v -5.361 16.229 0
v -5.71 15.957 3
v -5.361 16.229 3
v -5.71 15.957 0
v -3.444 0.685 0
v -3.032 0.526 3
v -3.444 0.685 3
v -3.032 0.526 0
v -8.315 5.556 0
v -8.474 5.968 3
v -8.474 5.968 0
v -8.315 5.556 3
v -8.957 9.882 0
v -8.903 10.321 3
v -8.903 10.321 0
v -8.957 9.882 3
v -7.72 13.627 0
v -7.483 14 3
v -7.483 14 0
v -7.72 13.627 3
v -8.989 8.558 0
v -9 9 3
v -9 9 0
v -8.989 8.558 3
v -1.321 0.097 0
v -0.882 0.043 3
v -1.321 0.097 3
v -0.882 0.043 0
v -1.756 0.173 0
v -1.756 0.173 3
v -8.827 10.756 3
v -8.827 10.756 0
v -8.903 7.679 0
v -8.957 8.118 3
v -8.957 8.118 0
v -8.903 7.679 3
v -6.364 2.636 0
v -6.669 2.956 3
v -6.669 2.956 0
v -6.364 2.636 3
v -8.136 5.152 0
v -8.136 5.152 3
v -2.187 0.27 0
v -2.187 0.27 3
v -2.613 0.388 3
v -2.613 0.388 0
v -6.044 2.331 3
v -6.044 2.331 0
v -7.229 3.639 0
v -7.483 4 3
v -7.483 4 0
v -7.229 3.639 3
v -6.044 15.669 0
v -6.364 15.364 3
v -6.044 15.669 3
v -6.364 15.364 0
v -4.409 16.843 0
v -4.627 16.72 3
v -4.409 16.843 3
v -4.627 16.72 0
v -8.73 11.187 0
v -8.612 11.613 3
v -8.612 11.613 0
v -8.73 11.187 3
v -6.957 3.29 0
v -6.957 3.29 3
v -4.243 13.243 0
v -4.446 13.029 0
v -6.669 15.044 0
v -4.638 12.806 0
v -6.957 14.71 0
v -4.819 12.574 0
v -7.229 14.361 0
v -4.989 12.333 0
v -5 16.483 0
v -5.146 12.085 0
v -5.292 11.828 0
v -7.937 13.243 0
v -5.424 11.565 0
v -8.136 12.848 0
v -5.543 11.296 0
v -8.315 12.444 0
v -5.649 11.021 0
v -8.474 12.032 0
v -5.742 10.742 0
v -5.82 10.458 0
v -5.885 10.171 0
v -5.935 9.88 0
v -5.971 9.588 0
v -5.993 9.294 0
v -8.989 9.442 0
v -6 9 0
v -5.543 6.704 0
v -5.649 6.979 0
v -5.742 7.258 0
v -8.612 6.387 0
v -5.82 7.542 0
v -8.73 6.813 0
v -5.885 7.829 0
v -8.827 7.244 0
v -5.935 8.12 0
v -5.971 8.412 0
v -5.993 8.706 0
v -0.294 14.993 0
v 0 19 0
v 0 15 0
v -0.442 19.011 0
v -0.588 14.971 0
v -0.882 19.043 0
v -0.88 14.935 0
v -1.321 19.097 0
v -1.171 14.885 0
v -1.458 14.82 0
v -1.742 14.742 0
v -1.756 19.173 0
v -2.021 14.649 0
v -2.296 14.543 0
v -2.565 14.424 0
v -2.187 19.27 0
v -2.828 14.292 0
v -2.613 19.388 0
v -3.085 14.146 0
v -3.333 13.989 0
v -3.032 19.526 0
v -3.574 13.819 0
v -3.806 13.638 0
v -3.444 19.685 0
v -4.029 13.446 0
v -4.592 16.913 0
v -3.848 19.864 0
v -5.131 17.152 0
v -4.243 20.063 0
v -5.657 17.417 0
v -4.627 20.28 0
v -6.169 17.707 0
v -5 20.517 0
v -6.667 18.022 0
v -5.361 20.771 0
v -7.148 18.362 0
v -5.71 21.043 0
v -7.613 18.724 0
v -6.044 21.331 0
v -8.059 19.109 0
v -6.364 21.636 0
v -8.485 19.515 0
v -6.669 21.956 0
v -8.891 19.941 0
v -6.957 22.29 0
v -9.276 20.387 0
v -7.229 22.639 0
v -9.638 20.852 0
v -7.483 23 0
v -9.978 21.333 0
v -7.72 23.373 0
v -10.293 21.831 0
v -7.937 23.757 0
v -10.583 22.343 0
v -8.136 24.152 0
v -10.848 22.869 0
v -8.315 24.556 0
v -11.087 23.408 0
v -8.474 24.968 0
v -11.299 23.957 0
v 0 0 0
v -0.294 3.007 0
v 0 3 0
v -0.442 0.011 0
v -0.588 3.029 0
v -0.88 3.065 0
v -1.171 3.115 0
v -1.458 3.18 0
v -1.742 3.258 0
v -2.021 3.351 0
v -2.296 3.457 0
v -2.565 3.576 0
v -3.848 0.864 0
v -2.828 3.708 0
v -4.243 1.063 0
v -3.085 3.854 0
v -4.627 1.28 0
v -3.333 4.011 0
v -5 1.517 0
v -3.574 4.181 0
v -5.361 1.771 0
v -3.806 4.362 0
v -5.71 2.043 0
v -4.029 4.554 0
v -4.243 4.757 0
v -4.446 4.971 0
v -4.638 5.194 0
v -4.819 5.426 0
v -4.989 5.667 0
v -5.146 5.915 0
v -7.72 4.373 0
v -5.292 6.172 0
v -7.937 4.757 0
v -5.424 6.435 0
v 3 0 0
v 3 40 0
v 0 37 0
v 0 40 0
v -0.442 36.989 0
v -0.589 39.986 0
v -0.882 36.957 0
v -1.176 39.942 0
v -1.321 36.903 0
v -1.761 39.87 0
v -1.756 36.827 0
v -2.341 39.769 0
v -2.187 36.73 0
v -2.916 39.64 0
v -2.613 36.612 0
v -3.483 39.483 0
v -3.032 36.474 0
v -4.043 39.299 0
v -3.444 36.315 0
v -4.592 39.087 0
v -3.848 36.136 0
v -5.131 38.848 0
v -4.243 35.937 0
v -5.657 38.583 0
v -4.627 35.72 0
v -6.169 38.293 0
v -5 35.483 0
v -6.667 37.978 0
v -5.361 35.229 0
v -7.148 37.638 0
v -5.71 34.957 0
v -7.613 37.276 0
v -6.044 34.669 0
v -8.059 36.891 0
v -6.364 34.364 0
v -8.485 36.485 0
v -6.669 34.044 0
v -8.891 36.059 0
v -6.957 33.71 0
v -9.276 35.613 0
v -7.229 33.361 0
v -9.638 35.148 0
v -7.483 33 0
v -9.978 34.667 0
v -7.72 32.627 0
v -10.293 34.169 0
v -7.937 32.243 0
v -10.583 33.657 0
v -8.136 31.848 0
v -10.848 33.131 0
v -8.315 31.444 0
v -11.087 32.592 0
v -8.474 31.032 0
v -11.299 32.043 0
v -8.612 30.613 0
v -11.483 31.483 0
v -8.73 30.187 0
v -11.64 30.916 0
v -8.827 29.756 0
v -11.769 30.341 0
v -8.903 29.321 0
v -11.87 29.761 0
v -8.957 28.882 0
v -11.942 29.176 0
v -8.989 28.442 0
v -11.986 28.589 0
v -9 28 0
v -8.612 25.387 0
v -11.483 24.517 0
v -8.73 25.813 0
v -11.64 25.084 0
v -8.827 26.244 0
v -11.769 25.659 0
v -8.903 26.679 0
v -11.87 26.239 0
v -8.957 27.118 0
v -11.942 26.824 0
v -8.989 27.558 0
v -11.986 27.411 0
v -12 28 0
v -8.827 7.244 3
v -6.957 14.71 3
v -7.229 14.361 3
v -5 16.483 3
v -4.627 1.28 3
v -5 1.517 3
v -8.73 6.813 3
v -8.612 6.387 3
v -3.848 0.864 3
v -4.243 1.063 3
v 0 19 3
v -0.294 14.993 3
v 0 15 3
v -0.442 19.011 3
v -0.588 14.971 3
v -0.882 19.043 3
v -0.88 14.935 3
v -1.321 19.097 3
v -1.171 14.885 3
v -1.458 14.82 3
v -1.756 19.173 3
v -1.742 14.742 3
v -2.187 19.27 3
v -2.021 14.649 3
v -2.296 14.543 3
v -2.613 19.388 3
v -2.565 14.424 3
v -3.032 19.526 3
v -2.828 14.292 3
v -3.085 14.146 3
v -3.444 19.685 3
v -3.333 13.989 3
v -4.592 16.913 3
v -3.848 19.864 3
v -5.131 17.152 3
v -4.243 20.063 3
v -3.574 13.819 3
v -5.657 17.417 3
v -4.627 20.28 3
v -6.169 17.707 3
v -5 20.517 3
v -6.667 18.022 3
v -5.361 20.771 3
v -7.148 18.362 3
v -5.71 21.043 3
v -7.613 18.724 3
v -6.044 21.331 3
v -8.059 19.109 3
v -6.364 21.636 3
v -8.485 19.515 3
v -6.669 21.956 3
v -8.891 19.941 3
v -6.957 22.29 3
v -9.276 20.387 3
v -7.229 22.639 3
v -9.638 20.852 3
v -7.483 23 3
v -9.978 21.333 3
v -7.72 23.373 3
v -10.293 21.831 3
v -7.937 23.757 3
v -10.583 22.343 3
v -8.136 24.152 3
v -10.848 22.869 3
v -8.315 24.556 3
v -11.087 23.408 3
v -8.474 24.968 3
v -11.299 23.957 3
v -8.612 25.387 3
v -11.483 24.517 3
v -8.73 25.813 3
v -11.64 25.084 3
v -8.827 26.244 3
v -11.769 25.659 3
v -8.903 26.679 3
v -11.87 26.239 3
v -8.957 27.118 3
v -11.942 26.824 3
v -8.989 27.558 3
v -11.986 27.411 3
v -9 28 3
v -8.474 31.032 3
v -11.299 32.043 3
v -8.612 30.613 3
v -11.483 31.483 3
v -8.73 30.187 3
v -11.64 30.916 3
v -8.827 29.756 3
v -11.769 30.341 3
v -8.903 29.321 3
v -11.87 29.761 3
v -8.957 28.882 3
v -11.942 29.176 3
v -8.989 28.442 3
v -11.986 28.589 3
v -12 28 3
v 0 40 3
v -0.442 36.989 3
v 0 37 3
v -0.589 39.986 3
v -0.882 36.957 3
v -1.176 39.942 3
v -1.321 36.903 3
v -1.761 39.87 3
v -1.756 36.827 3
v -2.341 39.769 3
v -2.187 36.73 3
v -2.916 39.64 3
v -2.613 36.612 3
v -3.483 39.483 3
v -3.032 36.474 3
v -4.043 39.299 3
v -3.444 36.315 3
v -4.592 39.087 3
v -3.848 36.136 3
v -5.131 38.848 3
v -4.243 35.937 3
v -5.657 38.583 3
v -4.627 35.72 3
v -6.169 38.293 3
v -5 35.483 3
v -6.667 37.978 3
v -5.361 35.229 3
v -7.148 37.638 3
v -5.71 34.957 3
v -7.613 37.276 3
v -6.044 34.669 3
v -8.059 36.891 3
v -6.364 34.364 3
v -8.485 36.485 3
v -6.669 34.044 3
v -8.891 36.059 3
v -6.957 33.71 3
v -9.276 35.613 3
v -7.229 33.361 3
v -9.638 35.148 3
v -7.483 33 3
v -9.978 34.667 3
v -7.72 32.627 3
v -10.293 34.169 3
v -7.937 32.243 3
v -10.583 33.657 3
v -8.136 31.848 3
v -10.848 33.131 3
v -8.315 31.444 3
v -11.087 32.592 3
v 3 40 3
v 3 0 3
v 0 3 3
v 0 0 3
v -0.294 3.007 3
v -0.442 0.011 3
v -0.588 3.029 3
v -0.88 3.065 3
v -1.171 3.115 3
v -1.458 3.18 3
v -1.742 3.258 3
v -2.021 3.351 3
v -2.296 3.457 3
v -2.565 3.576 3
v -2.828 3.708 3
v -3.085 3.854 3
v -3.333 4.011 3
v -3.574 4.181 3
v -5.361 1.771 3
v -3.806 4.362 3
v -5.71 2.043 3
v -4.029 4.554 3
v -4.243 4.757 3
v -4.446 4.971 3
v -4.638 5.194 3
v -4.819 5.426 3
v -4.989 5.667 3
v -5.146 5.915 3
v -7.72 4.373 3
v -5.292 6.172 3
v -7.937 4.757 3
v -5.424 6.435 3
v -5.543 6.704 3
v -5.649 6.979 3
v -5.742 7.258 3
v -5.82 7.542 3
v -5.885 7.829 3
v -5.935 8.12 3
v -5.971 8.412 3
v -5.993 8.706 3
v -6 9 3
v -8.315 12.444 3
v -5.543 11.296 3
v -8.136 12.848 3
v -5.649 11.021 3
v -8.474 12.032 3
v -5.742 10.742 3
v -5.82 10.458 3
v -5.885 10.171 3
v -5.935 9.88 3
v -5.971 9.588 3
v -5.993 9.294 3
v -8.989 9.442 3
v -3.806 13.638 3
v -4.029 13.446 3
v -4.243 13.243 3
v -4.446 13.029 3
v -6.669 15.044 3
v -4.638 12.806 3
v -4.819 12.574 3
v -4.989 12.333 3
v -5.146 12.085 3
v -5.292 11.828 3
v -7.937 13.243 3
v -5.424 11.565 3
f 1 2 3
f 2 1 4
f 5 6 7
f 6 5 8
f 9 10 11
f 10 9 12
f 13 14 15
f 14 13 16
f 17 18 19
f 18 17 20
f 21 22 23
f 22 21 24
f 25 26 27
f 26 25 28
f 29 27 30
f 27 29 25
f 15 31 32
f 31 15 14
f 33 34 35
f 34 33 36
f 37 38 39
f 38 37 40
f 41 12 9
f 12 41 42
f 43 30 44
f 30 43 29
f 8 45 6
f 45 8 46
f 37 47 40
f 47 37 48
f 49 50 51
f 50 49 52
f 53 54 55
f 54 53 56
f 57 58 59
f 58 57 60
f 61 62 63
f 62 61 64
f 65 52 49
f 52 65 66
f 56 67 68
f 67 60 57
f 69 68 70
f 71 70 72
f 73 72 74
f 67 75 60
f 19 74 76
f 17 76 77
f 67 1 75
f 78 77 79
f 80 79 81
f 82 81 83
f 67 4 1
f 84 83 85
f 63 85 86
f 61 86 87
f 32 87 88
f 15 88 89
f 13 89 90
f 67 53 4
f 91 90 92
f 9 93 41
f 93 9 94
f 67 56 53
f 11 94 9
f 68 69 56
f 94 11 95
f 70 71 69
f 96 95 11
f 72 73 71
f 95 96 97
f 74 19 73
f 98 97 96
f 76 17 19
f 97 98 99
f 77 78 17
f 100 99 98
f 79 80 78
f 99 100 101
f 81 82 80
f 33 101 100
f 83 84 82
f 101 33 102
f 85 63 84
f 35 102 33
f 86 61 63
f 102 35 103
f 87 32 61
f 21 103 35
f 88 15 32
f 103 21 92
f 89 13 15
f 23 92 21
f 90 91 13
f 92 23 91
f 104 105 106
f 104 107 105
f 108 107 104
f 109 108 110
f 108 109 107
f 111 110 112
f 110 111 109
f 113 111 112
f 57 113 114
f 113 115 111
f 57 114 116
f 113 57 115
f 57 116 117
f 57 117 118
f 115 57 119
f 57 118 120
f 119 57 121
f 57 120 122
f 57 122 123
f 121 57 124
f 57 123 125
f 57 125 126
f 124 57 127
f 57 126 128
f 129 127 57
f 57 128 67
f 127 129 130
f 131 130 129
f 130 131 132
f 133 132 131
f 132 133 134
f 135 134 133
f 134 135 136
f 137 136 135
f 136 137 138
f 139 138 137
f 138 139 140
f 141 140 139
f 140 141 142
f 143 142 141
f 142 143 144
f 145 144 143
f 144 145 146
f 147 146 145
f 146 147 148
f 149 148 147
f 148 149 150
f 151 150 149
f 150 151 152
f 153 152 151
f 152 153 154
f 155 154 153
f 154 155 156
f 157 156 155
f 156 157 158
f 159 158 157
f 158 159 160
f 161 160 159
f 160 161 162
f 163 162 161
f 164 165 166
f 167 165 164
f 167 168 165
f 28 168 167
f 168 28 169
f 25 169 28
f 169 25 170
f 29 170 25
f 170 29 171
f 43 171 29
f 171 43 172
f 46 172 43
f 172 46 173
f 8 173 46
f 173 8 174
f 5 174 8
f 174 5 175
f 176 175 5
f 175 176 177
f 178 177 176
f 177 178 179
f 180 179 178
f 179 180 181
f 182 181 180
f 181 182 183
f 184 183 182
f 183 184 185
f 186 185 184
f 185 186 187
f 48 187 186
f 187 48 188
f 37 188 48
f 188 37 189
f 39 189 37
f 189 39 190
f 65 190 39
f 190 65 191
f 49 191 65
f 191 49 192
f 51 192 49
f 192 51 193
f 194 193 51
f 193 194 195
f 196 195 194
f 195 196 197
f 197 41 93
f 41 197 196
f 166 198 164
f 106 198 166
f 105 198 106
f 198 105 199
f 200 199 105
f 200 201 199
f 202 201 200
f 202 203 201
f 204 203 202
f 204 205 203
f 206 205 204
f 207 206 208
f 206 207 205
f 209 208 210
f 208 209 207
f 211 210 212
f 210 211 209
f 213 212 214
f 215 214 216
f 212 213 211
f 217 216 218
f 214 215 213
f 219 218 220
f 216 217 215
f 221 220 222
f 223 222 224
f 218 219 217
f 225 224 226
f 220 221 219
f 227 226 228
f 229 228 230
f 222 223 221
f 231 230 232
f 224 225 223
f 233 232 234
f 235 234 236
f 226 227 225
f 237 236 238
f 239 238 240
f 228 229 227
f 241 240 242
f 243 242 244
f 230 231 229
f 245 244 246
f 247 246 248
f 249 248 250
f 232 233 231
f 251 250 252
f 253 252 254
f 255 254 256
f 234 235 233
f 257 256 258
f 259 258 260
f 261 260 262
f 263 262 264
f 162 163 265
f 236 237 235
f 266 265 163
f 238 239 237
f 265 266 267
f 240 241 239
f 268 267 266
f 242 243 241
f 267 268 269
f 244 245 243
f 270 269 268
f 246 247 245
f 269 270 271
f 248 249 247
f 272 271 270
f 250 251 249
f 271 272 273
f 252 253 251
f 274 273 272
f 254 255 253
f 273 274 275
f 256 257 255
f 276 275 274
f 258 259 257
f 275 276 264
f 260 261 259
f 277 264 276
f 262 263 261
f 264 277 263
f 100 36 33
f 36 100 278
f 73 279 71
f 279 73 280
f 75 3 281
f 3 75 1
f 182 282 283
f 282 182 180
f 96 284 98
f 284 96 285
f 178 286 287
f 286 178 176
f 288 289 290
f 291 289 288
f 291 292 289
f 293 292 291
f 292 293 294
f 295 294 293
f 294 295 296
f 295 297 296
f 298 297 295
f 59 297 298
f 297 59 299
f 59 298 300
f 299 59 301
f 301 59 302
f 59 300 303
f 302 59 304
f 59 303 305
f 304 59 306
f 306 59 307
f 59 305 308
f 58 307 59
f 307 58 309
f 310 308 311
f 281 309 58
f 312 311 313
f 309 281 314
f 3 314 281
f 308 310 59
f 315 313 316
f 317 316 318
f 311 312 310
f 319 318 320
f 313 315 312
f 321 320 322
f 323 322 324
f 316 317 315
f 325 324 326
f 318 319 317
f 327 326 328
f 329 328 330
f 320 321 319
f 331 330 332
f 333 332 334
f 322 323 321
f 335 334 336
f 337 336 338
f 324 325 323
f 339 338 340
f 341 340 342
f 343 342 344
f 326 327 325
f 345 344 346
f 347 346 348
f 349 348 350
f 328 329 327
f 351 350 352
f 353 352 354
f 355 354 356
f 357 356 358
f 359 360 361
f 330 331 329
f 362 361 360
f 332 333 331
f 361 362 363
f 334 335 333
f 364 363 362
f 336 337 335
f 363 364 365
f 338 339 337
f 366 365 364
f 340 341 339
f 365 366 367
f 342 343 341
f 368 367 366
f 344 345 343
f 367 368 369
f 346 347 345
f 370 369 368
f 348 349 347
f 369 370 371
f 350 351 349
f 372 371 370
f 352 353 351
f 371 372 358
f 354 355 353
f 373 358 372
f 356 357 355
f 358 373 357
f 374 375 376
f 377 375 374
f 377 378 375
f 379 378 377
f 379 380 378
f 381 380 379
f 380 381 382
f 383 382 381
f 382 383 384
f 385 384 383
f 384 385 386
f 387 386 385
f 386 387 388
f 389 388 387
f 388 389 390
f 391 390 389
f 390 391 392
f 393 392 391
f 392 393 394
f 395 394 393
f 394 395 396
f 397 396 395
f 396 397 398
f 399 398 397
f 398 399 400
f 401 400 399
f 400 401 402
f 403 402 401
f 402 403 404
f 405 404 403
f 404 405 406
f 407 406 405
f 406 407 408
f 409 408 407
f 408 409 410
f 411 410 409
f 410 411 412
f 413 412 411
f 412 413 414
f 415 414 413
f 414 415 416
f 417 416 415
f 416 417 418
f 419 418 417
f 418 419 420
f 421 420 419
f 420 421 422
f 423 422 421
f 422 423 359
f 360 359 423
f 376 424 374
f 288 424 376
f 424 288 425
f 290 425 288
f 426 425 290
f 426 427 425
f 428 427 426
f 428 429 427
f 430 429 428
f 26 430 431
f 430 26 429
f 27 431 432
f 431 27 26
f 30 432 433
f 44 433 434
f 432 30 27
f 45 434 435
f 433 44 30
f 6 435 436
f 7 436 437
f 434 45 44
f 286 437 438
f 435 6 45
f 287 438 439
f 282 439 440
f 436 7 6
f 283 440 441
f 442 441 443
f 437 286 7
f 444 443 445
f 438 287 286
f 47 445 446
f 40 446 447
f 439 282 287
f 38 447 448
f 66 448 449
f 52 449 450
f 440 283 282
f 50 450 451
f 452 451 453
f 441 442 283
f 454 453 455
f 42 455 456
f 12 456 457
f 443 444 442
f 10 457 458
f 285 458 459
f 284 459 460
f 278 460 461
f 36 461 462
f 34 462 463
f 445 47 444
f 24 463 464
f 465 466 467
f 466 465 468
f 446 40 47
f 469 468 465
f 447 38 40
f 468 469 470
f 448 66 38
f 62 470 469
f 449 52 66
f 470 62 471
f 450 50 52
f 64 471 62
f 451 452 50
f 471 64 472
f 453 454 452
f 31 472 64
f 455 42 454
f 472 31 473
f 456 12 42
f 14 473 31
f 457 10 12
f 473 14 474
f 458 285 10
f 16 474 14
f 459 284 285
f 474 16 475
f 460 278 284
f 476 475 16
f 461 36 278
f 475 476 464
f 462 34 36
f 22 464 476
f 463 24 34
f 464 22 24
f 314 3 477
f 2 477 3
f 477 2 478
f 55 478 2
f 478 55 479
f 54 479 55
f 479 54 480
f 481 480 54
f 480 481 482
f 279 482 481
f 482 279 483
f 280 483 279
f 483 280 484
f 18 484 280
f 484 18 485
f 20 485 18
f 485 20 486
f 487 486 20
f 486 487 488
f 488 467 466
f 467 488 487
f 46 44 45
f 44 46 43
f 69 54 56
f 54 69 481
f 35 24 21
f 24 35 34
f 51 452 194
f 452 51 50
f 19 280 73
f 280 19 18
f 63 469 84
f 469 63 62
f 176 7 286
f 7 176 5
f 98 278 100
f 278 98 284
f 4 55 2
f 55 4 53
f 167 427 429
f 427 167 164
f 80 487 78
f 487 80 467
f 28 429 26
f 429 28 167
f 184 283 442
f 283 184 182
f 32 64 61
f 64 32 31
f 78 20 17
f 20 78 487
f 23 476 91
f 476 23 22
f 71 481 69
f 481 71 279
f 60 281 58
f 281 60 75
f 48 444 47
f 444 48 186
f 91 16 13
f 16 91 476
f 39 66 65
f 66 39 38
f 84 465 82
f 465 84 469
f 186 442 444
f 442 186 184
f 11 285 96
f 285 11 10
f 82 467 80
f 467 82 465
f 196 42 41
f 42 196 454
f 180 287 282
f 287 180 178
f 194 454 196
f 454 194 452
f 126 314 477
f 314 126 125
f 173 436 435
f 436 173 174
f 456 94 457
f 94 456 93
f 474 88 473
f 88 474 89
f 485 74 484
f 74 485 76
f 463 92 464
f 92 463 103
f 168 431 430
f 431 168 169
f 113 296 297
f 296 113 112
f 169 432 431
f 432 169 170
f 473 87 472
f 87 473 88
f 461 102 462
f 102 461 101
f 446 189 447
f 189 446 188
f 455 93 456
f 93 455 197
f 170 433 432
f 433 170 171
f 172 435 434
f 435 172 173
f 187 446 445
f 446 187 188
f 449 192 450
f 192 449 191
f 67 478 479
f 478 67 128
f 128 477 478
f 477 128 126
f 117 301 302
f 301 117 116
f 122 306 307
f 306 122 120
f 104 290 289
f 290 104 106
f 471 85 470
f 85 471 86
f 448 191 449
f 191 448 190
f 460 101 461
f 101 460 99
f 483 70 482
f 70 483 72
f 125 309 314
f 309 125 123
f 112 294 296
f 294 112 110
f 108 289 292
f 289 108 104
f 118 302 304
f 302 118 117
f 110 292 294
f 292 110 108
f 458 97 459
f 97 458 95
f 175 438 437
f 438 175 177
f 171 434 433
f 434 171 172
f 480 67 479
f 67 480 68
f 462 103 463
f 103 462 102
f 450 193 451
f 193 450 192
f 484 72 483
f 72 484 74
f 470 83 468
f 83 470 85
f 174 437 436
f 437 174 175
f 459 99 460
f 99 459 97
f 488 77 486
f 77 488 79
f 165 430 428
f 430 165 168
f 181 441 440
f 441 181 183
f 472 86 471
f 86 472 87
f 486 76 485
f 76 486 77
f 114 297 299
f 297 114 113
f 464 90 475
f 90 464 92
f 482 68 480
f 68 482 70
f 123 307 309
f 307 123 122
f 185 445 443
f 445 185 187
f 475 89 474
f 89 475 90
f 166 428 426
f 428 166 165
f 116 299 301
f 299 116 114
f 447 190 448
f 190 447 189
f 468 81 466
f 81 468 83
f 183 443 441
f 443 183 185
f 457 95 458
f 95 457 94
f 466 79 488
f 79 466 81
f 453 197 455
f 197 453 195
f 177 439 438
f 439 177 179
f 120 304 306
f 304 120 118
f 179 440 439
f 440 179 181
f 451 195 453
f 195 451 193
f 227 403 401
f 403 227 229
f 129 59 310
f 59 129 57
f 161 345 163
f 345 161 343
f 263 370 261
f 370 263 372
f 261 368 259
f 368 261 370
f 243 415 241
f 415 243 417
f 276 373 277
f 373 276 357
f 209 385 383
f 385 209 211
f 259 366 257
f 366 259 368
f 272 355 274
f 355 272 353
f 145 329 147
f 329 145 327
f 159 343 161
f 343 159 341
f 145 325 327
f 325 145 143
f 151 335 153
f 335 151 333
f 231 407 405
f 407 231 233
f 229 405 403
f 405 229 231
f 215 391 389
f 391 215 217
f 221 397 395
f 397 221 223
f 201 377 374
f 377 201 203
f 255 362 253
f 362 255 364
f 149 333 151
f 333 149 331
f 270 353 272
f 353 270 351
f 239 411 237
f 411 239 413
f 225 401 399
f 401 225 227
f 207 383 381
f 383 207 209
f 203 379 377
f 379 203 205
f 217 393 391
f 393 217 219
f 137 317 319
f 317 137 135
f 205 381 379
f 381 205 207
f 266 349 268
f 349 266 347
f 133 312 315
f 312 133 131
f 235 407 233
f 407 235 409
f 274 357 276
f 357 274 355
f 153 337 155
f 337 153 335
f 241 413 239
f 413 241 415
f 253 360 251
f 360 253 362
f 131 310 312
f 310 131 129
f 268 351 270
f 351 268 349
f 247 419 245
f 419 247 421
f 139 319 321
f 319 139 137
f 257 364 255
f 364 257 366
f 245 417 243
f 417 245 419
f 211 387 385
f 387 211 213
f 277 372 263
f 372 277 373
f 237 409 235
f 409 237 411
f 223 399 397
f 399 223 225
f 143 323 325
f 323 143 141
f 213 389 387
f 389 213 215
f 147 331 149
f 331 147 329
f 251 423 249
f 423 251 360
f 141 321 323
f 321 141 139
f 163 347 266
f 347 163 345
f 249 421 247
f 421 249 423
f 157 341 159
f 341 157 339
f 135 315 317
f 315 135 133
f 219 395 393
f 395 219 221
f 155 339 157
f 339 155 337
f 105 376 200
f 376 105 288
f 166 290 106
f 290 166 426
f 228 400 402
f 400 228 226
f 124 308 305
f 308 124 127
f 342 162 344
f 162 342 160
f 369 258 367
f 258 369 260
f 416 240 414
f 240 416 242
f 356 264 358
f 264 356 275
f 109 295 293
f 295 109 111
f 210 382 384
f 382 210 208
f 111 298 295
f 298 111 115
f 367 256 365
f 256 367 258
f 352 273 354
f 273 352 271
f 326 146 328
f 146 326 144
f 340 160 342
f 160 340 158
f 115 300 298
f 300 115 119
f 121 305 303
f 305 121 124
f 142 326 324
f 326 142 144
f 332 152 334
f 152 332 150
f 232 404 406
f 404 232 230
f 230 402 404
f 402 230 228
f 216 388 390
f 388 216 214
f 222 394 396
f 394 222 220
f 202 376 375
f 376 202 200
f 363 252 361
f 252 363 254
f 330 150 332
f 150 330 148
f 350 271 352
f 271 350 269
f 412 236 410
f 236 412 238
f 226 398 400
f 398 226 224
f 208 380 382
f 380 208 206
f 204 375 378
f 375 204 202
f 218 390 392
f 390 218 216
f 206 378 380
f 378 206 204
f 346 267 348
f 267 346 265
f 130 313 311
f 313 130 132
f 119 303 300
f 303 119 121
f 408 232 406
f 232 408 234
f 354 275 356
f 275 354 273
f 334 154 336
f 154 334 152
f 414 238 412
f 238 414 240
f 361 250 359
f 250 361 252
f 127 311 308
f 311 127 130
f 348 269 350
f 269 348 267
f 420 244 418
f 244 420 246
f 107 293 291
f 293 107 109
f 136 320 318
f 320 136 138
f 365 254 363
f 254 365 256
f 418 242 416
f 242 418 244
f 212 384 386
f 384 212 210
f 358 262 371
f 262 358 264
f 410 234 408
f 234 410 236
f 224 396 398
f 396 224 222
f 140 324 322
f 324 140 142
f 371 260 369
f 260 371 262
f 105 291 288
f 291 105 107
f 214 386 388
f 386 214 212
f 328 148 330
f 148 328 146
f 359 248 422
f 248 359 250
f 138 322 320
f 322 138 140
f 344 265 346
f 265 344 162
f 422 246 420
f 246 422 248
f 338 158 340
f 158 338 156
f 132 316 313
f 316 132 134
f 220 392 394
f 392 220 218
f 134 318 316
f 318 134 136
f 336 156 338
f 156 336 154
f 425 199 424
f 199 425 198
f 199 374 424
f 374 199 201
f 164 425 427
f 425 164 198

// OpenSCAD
//буква B
$fn=128;
union(){


cube([3,40,3]);

difference(){
  translate([0,9,0]) cylinder(3,9,9);

 translate([1,-1,0]) cube(30);
  
  translate([0,9,0]) cylinder(3,6,6);
}
difference(){
translate([0,28,0])
cylinder(3,12,12);
translate([0,15,0])
cube(40);
translate([0,28,0])
cylinder(3,9,9);
}
}
